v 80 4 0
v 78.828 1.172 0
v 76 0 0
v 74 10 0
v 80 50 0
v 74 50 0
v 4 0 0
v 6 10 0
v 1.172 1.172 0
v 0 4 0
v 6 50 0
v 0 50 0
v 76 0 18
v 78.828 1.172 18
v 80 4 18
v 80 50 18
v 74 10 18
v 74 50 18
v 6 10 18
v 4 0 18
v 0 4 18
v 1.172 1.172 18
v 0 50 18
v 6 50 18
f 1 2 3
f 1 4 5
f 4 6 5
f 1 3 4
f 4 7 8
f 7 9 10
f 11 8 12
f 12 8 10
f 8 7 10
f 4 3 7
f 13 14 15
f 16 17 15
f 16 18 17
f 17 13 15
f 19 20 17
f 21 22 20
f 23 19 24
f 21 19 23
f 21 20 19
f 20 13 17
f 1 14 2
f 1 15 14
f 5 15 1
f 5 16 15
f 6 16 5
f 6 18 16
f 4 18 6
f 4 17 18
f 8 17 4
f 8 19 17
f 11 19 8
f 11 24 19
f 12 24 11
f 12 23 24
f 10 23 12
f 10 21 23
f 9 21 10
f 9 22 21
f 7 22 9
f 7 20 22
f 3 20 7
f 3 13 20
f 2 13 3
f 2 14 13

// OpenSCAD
$fn = 32;

// ----------------------------------------------------------------------
// Heat sink frame: 80 x 50 mm frame, 6 mm walls
// ----------------------------------------------------------------------

// --- parameters (mm) ---
profile_height = 18;      // extrusion height
profile_points = 12;      // points of the closed outline

profile = [[0, 4], [1.172, 1.172], [4, 0], [76, 0], [78.828, 1.172], [80, 4], [80, 50], [74, 50], [74, 10], [6, 10], [6, 50], [0, 50]];  // single closed polygon, 12 points, counter clockwise

// --- the one profile operation ---
linear_extrude(height = profile_height) polygon(points = profile);
